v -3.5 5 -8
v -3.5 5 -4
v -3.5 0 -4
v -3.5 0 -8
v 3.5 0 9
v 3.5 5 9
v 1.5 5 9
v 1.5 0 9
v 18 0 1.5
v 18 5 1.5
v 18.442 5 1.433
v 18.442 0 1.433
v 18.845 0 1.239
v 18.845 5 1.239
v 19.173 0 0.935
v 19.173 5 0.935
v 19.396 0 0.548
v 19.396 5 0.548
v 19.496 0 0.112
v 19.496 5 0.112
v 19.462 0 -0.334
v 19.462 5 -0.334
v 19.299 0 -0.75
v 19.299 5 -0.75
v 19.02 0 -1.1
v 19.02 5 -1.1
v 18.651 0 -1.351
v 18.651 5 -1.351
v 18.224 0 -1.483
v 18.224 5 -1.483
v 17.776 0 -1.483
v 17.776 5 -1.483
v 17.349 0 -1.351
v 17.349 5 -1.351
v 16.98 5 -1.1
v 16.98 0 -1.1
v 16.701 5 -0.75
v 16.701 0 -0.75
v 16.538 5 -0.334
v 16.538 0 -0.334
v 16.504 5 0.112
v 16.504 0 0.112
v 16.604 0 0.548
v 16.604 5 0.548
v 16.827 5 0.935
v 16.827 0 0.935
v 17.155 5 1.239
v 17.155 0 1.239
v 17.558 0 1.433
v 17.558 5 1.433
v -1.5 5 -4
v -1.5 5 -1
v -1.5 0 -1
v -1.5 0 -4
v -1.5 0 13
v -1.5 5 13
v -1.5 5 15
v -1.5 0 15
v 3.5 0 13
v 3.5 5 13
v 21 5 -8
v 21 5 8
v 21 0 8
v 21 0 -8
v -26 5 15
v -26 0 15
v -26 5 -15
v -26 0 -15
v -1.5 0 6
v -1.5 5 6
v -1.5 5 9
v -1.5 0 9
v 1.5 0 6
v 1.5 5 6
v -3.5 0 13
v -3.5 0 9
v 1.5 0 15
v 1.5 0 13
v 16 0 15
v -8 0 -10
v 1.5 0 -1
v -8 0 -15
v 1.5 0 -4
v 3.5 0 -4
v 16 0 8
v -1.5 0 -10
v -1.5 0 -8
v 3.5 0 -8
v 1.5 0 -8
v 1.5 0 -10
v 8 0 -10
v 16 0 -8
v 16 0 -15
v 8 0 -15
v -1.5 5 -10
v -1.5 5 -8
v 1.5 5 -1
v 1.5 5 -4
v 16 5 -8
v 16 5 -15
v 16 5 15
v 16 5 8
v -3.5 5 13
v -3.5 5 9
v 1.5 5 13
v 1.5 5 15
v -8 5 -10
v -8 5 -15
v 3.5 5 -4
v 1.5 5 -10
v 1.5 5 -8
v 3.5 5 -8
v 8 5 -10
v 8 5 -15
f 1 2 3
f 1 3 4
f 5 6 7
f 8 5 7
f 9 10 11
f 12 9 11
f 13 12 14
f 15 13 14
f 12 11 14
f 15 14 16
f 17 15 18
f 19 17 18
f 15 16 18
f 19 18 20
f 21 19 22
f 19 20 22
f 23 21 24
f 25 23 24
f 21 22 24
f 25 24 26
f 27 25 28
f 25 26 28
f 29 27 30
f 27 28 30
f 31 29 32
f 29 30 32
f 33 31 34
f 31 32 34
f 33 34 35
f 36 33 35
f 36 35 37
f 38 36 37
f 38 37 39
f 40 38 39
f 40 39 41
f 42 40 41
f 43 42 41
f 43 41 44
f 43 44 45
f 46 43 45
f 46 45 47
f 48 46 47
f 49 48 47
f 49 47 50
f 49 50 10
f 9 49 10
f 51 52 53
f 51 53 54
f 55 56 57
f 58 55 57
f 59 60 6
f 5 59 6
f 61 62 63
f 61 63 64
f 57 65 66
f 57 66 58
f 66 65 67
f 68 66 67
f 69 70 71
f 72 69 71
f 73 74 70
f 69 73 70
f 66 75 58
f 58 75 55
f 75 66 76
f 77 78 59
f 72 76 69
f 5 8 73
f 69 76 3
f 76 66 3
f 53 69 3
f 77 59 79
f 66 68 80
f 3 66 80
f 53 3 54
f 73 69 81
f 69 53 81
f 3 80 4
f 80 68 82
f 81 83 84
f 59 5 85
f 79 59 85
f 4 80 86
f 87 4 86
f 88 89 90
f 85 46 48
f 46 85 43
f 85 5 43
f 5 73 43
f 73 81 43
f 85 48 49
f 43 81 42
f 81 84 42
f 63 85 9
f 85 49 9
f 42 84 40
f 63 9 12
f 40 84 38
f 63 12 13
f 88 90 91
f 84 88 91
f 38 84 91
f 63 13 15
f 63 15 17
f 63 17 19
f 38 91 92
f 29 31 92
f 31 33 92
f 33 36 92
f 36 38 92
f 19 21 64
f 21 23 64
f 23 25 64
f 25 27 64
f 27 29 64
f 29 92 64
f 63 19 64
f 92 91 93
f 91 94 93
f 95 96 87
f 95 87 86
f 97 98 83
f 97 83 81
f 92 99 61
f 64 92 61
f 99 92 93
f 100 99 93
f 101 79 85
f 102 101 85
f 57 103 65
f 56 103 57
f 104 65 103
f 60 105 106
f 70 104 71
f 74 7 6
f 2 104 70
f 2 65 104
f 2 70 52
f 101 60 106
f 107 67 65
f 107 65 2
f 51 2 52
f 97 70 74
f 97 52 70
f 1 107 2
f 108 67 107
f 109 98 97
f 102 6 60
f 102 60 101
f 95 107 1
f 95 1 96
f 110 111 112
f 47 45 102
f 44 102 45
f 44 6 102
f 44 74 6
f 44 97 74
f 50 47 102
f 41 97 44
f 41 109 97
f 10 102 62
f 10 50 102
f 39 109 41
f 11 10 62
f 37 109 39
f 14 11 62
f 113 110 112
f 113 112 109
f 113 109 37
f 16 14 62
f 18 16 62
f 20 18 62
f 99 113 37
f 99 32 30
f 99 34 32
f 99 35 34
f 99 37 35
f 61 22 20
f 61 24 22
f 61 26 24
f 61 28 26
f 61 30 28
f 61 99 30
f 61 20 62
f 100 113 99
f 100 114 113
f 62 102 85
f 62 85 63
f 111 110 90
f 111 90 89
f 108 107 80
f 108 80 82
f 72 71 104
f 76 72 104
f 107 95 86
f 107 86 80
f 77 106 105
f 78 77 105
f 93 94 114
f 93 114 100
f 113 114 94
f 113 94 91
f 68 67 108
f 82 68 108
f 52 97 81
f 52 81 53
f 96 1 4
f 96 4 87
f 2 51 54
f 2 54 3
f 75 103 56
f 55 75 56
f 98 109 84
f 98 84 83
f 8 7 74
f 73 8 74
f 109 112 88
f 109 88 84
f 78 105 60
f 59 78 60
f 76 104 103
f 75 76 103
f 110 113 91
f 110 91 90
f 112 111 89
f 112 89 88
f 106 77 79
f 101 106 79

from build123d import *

# Parameters (mm, degrees)
CROQUIS1_W              = 32
CROQUIS1_H              = 30
SALIENTE_EXTRUIR1_DEPTH = 5
CORTAR_EXTRUIR1_DEPTH   = 23.494443758
CORTAR_EXTRUIR2_DEPTH   = 23.494443758
CROQUIS4_W              = 10
CROQUIS4_H              = 16
SALIENTE_EXTRUIR2_DEPTH = 5
CROQUIS5_R              = 1.5
CORTAR_EXTRUIR3_DEPTH   = 27.286878856
CROQUIS6_W              = 10
CROQUIS6_H              = 30
SALIENTE_EXTRUIR3_DEPTH = 5


with BuildPart() as part:
    # Croquis1 → Saliente-Extruir1 (new body)
    with BuildSketch(Plane(origin=(0, 0, 0), x_dir=(1, 0, 0), z_dir=(0, 1, 0))):
        Rectangle(CROQUIS1_W, CROQUIS1_H)
    extrude(amount=SALIENTE_EXTRUIR1_DEPTH)

    # Croquis2 → Cortar-Extruir1 (cut, through all)
    with BuildSketch(Plane(origin=(0, 5, 0), x_dir=(1, 0, 0), z_dir=(0, 1, 0))):
        Polygon((-8, 15), (8, 15), (8, 10), (1.5, 10), (1.5, 8), (3.5, 8), (3.5, 4), (1.5, 4), (1.5, 1), (-1.5, 1), (-1.5, 4), (-3.5, 4), (-3.5, 8), (-1.5, 8), (-1.5, 10), (-8, 10), align=None)
    extrude(amount=-CORTAR_EXTRUIR1_DEPTH, mode=Mode.SUBTRACT)

    # Croquis3 → Cortar-Extruir2 (cut, through all)
    with BuildSketch(Plane(origin=(0, 5, 0), x_dir=(1, 0, 0), z_dir=(0, 1, 0))):
        Polygon((1.5, -15), (1.5, -13), (3.5, -13), (3.5, -9), (1.5, -9), (1.5, -6), (-1.5, -6), (-1.5, -9), (-3.5, -9), (-3.5, -13), (-1.5, -13), (-1.5, -15), align=None)
    extrude(amount=-CORTAR_EXTRUIR2_DEPTH, mode=Mode.SUBTRACT)

    # Croquis4 → Saliente-Extruir2 (add)
    with BuildSketch(Plane(origin=(0, 5, 0), x_dir=(1, 0, 0), z_dir=(0, 1, 0))):
        with Locations((16, 0)):
            Rectangle(CROQUIS4_W, CROQUIS4_H)
    extrude(amount=-SALIENTE_EXTRUIR2_DEPTH)

    # Croquis5 → Cortar-Extruir3 (cut, through all)
    with BuildSketch(Plane(origin=(0, 5, 0), x_dir=(1, 0, 0), z_dir=(0, 1, 0))):
        with Locations(Location((18, 0, 0), (0, 0, 270))):
            Circle(CROQUIS5_R)
    extrude(amount=-CORTAR_EXTRUIR3_DEPTH, mode=Mode.SUBTRACT)

    # Croquis6 → Saliente-Extruir3 (add)
    with BuildSketch(Plane(origin=(0, 5, 0), x_dir=(1, 0, 0), z_dir=(0, 1, 0))):
        with Locations((-21, 0)):
            Rectangle(CROQUIS6_W, CROQUIS6_H)
    extrude(amount=-SALIENTE_EXTRUIR3_DEPTH)


solid = part.part
